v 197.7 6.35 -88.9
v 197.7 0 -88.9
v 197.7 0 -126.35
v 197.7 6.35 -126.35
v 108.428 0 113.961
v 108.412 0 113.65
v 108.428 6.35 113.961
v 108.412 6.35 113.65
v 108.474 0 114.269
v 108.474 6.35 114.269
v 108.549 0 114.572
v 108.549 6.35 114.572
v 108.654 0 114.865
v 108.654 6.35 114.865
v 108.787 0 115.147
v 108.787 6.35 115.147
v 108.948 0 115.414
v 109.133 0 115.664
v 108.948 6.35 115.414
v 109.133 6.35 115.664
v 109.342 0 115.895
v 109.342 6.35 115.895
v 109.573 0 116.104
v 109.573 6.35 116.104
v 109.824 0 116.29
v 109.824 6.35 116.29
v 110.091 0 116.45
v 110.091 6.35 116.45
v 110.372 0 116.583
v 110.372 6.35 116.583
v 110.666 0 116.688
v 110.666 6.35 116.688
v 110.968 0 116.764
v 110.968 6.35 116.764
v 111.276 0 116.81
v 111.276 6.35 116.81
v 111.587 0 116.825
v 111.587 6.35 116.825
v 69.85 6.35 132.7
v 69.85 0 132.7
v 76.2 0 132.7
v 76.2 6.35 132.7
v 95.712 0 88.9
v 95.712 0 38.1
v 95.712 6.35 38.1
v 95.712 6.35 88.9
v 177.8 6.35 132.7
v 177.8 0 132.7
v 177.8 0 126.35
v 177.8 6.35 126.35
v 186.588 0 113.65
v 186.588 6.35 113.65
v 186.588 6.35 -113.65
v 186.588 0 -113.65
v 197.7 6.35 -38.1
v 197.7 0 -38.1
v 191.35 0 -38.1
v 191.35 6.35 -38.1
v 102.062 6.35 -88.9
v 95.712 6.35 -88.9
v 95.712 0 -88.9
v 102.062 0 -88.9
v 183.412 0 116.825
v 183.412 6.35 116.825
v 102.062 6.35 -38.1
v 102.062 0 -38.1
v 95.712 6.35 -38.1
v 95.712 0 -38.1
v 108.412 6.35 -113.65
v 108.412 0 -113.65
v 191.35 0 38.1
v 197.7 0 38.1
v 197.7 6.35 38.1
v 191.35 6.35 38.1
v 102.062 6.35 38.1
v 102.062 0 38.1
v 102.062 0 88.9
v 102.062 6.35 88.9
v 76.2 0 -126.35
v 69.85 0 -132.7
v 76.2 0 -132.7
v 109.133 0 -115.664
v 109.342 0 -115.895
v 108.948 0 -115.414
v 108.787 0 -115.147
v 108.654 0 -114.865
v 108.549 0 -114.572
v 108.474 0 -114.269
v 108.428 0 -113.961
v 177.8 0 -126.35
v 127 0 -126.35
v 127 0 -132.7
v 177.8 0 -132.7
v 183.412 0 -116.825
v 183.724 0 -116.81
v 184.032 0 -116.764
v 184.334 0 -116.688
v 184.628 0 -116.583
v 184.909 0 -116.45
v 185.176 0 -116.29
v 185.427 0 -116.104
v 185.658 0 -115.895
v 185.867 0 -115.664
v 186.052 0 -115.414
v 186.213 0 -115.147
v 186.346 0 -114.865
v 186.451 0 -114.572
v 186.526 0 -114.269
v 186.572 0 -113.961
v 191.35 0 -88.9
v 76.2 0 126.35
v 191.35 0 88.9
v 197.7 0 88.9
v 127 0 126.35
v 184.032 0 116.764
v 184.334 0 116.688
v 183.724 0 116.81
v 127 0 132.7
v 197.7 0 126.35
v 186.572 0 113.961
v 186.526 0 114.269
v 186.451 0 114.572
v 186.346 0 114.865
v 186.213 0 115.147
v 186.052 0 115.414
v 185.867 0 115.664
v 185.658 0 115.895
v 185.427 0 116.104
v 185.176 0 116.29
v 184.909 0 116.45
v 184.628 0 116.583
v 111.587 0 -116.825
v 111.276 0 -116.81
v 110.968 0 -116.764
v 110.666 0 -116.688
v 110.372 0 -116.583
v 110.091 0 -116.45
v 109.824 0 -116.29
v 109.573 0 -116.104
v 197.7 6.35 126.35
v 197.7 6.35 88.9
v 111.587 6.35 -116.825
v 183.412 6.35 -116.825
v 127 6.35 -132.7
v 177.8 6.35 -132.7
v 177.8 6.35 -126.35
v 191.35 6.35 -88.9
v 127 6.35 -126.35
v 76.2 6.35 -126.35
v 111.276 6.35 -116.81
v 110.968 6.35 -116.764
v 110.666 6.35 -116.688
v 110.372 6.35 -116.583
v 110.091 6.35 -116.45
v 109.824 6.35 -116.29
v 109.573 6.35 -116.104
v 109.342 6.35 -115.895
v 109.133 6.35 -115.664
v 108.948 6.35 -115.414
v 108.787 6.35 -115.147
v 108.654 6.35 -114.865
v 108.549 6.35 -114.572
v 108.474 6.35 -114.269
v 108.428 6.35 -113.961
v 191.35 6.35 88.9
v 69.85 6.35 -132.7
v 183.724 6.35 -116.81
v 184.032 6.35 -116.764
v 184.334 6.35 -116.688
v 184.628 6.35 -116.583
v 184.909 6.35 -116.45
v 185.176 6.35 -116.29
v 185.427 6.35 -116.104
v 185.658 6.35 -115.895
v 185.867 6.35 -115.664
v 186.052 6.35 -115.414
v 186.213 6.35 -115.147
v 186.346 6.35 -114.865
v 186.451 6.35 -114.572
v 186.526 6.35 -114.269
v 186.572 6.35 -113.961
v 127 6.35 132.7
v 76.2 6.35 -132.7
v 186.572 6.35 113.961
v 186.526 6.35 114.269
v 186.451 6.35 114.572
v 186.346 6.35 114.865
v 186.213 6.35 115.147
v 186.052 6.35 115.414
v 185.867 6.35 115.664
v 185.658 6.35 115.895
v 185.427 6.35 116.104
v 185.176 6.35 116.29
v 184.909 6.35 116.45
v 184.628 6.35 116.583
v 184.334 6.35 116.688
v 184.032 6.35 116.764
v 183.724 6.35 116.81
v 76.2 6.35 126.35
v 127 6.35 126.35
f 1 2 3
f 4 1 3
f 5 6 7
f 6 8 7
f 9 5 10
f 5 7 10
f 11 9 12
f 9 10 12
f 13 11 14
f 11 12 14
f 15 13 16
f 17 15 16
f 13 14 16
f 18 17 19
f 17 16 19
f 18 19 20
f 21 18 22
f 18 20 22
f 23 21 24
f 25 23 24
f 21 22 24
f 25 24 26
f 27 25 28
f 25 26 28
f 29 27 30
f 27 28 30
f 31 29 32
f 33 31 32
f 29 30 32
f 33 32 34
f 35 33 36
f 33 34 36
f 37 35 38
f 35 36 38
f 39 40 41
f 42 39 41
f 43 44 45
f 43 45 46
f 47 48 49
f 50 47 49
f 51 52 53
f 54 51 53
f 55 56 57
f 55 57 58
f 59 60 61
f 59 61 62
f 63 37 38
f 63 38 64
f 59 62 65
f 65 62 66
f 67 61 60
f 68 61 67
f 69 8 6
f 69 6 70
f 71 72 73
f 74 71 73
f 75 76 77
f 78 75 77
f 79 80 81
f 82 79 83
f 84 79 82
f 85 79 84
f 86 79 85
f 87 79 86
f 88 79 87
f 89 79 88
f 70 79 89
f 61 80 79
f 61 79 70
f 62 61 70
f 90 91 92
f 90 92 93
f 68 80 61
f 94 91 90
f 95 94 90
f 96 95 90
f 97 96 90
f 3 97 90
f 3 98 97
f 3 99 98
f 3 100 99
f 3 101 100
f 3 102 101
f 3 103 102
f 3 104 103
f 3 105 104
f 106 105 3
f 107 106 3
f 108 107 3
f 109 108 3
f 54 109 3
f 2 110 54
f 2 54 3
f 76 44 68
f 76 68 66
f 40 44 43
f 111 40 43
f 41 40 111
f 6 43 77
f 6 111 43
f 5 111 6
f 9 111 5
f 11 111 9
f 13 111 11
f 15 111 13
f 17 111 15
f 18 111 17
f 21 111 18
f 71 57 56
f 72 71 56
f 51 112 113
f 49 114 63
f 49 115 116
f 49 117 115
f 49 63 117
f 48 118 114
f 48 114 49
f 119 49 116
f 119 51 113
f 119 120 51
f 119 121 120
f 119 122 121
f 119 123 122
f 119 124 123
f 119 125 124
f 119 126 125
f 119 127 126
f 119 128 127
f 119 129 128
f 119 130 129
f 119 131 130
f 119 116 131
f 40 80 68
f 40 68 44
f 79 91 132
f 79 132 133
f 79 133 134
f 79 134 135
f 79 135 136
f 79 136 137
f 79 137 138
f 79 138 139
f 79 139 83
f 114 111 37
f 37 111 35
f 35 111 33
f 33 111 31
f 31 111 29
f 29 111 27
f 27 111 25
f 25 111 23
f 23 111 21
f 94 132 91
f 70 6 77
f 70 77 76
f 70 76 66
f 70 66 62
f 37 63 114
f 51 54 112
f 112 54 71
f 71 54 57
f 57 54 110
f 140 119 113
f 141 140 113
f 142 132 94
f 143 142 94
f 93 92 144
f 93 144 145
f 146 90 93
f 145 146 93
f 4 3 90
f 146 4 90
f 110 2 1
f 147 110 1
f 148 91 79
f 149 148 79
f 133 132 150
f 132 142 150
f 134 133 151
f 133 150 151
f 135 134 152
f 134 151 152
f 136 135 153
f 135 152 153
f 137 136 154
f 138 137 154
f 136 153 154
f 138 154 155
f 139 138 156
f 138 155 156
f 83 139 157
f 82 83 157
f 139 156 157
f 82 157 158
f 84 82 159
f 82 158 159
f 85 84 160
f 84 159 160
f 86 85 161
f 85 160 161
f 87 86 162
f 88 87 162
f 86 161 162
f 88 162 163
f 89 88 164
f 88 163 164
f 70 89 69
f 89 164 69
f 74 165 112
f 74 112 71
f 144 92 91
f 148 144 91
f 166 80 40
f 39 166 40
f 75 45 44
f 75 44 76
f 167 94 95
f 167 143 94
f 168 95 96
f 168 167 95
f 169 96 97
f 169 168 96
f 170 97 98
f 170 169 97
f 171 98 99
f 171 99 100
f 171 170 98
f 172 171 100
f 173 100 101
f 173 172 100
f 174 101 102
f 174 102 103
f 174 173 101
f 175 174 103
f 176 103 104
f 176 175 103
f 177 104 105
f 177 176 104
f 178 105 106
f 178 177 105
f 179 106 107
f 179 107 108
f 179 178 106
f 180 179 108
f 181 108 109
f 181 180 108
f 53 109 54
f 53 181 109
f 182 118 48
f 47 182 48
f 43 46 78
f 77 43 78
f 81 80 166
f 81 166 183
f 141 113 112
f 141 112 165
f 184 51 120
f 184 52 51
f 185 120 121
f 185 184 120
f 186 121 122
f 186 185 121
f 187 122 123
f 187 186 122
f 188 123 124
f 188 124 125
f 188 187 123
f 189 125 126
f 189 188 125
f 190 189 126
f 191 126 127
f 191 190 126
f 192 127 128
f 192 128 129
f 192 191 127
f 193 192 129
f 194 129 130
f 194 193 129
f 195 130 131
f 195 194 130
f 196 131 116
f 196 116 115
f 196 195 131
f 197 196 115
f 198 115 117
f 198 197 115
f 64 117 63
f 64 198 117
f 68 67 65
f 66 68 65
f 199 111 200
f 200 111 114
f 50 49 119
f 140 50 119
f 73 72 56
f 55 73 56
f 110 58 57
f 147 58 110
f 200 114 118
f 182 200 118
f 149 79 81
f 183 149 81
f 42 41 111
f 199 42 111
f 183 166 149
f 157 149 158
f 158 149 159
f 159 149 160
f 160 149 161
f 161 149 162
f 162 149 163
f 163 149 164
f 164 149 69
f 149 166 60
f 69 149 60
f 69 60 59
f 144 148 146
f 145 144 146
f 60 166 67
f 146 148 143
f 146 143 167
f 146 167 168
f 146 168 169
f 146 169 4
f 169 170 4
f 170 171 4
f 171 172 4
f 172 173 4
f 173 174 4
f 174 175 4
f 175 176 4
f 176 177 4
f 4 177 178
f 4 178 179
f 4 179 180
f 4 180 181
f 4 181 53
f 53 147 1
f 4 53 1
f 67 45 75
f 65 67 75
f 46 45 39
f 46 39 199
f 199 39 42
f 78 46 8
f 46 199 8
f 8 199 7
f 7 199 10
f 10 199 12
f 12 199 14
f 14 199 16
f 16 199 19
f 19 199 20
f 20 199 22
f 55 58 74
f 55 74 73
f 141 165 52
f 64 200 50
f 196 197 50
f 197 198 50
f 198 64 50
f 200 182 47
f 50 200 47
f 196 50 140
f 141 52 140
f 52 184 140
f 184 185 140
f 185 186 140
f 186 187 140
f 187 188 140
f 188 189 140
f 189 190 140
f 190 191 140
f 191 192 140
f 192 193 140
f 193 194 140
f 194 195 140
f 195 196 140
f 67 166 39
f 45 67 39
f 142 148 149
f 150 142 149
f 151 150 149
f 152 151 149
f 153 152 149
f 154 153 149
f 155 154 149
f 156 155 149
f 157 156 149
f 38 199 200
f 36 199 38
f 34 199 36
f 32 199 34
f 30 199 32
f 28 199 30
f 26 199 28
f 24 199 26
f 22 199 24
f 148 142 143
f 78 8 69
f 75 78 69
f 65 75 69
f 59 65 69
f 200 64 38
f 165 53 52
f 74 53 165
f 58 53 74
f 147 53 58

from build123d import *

# Parameters (mm, degrees)
SKETCH5_W           = 395.4
SKETCH5_H           = 265.4
BOSS_EXTRUDE3_DEPTH = 6.35
SKETCH6_W           = 78.175
SKETCH6_H           = 243.175
SKETCH6_W_2         = 75
SKETCH6_H_2         = 240
CUT_EXTRUDE1_DEPTH  = 6.35
SKETCH10_W          = 6.35
SKETCH10_H          = 50.8
SKETCH10_W_2        = 50.8
SKETCH10_H_2        = 6.35
CUT_EXTRUDE2_DEPTH  = 6.35
SKETCH11_W          = 50.8
SKETCH11_H          = 6.35
CUT_EXTRUDE3_DEPTH  = 6.35
SKETCH12_W          = 78.175
SKETCH12_H          = 4.7625
BOSS_EXTRUDE4_DEPTH = 6.35
FILLET1_R           = 3.175
CUT_EXTRUDE4_DEPTH  = 239.190895082


with BuildPart() as part:
    # Sketch5 → Boss-Extrude3 (new body)
    with BuildSketch(Plane(origin=(0, 0, 0), x_dir=(1, 0, 0), z_dir=(0, 1, 0))):
        Rectangle(SKETCH5_W, SKETCH5_H)
    extrude(amount=BOSS_EXTRUDE3_DEPTH)

    # Sketch6 → Cut-Extrude1 (cut)
    # profile 1 of 4: a face of its own
    with BuildSketch(Plane(origin=(0, 6.35, 0), x_dir=(1, 0, 0), z_dir=(0, 1, 0))):
        with Locations((147.5, 0)):
            Rectangle(SKETCH6_W, SKETCH6_H)
        with Locations((147.5, 0)):
            Rectangle(SKETCH6_W_2, SKETCH6_H_2, mode=Mode.SUBTRACT)
    # profile 2 of 4: a face of its own
    with BuildSketch(Plane(origin=(0, 6.35, 0), x_dir=(1, 0, 0), z_dir=(0, 1, 0))):
        with Locations((147.5, 0)):
            Rectangle(SKETCH6_W_2, SKETCH6_H_2)
    # profile 3 of 4: a face of its own
    with BuildSketch(Plane(origin=(0, 6.35, 0), x_dir=(1, 0, 0), z_dir=(0, 1, 0))):
        with Locations((-147.5, 0)):
            Rectangle(SKETCH6_W, SKETCH6_H)
        with Locations((-147.5, 0)):
            Rectangle(SKETCH6_W_2, SKETCH6_H_2, mode=Mode.SUBTRACT)
    # profile 4 of 4: a face of its own
    with BuildSketch(Plane(origin=(0, 6.35, 0), x_dir=(1, 0, 0), z_dir=(0, 1, 0))):
        with Locations((-147.5, 0)):
            Rectangle(SKETCH6_W_2, SKETCH6_H_2)
    extrude(amount=-CUT_EXTRUDE1_DEPTH, mode=Mode.SUBTRACT)

    # Sketch10 → Cut-Extrude2 (cut)
    with BuildSketch(Plane.XZ):
        with Locations((98.8875, -63.5)):
            Rectangle(SKETCH10_W, SKETCH10_H)
        with Locations((98.8875, 63.5)):
            Rectangle(SKETCH10_W, SKETCH10_H)
        with Locations((-98.8875, 63.5)):
            Rectangle(SKETCH10_W, SKETCH10_H)
        with Locations((-98.8875, -63.5)):
            Rectangle(SKETCH10_W, SKETCH10_H)
        Polygon((197.7, 132.7), (177.8, 132.7), (177.8, 126.35), (191.35, 126.35), (197.7, 126.35), align=None)
        Polygon((127, 132.7), (76.2, 132.7), (76.2, 126.35), (95.7125, 126.35), (102.0625, 126.35), (108.4125, 126.35), (127, 126.35), align=None)
        with Locations((0, 129.525)):
            Rectangle(SKETCH10_W_2, SKETCH10_H_2)
        Polygon((-127, 132.7), (-127, 126.35), (-108.4125, 126.35), (-102.0625, 126.35), (-95.7125, 126.35), (-76.2, 126.35), (-76.2, 132.7), align=None)
        Polygon((-197.7, 126.35), (-191.35, 126.35), (-177.8, 126.35), (-177.8, 132.7), (-197.7, 132.7), align=None)
        Polygon((-177.8, -126.35), (-191.35, -126.35), (-197.7, -126.35), (-197.7, -132.7), (-177.8, -132.7), align=None)
        Polygon((-108.4125, -126.35), (-127, -126.35), (-127, -132.7), (-76.2, -132.7), (-76.2, -126.35), (-95.7125, -126.35), (-102.0625, -126.35), align=None)
        with Locations((0, -129.525)):
            Rectangle(SKETCH10_W_2, SKETCH10_H_2)
        Polygon((76.2, -126.35), (76.2, -132.7), (127, -132.7), (127, -126.35), (108.4125, -126.35), (102.0625, -126.35), (95.7125, -126.35), align=None)
        Polygon((177.8, -126.35), (177.8, -132.7), (197.7, -132.7), (197.7, -126.35), (191.35, -126.35), align=None)
    extrude(amount=-CUT_EXTRUDE2_DEPTH, mode=Mode.SUBTRACT)

    # Sketch11 → Cut-Extrude3 (cut)
    with BuildSketch(Plane(origin=(197.7, 0, 0), x_dir=(0, 0, -1), z_dir=(1, 0, 0))):
        with Locations((-63.5, 3.175)):
            Rectangle(SKETCH11_W, SKETCH11_H)
        with Locations((63.5, 3.175)):
            Rectangle(SKETCH11_W, SKETCH11_H)
    cut_extrude3 = extrude(amount=-CUT_EXTRUDE3_DEPTH, mode=Mode.SUBTRACT)

    # Mirror1: Cut-Extrude3 across plane
    add(cut_extrude3.mirror(Plane(origin=(0, 0, 0), x_dir=(0, 0, 1), z_dir=(1, 0, 0))), mode=Mode.SUBTRACT)

    # Sketch12 → Boss-Extrude4 (add)
    with BuildSketch(Plane.XZ):
        with Locations((147.5, -119.20625)):
            Rectangle(SKETCH12_W, SKETCH12_H)
        with Locations((147.5, 119.20625)):
            Rectangle(SKETCH12_W, SKETCH12_H)
        with Locations((-147.5, 119.20625)):
            Rectangle(SKETCH12_W, SKETCH12_H)
        with Locations((-147.5, -119.20625)):
            Rectangle(SKETCH12_W, SKETCH12_H)
    extrude(amount=-BOSS_EXTRUDE4_DEPTH)

    # Fillet1
    fillet1_edges = [part.edges().sort_by_distance(p)[0] for p in [
        (108.4125, 3.175, -116.825),
        (186.5875, 3.175, -116.825),
        (186.5875, 3.175, 116.825),
        (108.4125, 3.175, 116.825),
        (-186.5875, 3.175, 116.825),
        (-108.4125, 3.175, 116.825),
        (-108.4125, 3.175, -116.825),
        (-186.5875, 3.175, -116.825),
    ]]
    fillet(fillet1_edges, radius=FILLET1_R)

    # Sketch13 → Cut-Extrude4 (cut, through all)
    with BuildSketch(Plane.XZ):
        Polygon((25.4, -132.7), (69.85, -132.7), (69.85, 132.7), (25.4, 132.7), (25.4, 126.35), (-25.4, 126.35), (-25.4, 132.7), (-69.85, 132.7), (-69.85, -132.7), (-25.4, -132.7), (-25.4, -126.35), (25.4, -126.35), align=None)
        Polygon((-76.2, -132.7), (-69.85, -132.7), (-69.85, 132.7), (-76.2, 132.7), (-76.2, 126.35), (-127, 126.35), (-127, 132.7), (-177.8, 132.7), (-177.8, 126.35), (-197.7, 126.35), (-197.7, 88.9), (-191.35, 88.9), (-191.35, 38.1), (-197.7, 38.1), (-197.7, -38.1), (-191.35, -38.1), (-191.35, -88.9), (-197.7, -88.9), (-197.7, -126.35), (-177.8, -126.35), (-177.8, -132.7), (-127, -132.7), (-127, -126.35), (-76.2, -126.35), align=None)
    extrude(amount=-CUT_EXTRUDE4_DEPTH, mode=Mode.SUBTRACT)


solid = part.part
